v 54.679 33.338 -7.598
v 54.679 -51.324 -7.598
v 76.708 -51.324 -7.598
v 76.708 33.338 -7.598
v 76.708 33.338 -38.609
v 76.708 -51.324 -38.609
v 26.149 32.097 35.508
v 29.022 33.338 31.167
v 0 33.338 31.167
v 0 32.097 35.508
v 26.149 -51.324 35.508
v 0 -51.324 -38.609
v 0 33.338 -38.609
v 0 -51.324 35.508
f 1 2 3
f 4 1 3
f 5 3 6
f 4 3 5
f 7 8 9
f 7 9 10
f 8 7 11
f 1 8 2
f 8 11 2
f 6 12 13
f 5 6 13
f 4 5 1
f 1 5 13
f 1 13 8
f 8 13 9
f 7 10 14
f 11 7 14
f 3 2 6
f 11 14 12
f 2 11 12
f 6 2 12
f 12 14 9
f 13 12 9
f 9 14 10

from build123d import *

# Parameters (mm, degrees)
F1_DEPTH = 76.708
F3_DEPTH = 88.392


with BuildPart() as f1:
    # F0 (on Right) → F1 (new body)
    with BuildSketch(Plane.YZ):
        Polygon((32.097038, 35.508316), (-51.324245, 35.508316), (-51.324245, -38.609475), (33.337504, -38.609475), (33.337504, 31.166688), align=None)
    extrude(amount=F1_DEPTH)

    # F2 (on face) → F3 (cut)
    with BuildSketch(Plane.XZ.offset(51.324245)):
        Polygon((76.708, 35.508316), (26.148705, 35.508316), (54.679401, -7.597849), (76.708, -7.597849), align=None)
    extrude(amount=-F3_DEPTH, mode=Mode.SUBTRACT)


solid = f1.part
